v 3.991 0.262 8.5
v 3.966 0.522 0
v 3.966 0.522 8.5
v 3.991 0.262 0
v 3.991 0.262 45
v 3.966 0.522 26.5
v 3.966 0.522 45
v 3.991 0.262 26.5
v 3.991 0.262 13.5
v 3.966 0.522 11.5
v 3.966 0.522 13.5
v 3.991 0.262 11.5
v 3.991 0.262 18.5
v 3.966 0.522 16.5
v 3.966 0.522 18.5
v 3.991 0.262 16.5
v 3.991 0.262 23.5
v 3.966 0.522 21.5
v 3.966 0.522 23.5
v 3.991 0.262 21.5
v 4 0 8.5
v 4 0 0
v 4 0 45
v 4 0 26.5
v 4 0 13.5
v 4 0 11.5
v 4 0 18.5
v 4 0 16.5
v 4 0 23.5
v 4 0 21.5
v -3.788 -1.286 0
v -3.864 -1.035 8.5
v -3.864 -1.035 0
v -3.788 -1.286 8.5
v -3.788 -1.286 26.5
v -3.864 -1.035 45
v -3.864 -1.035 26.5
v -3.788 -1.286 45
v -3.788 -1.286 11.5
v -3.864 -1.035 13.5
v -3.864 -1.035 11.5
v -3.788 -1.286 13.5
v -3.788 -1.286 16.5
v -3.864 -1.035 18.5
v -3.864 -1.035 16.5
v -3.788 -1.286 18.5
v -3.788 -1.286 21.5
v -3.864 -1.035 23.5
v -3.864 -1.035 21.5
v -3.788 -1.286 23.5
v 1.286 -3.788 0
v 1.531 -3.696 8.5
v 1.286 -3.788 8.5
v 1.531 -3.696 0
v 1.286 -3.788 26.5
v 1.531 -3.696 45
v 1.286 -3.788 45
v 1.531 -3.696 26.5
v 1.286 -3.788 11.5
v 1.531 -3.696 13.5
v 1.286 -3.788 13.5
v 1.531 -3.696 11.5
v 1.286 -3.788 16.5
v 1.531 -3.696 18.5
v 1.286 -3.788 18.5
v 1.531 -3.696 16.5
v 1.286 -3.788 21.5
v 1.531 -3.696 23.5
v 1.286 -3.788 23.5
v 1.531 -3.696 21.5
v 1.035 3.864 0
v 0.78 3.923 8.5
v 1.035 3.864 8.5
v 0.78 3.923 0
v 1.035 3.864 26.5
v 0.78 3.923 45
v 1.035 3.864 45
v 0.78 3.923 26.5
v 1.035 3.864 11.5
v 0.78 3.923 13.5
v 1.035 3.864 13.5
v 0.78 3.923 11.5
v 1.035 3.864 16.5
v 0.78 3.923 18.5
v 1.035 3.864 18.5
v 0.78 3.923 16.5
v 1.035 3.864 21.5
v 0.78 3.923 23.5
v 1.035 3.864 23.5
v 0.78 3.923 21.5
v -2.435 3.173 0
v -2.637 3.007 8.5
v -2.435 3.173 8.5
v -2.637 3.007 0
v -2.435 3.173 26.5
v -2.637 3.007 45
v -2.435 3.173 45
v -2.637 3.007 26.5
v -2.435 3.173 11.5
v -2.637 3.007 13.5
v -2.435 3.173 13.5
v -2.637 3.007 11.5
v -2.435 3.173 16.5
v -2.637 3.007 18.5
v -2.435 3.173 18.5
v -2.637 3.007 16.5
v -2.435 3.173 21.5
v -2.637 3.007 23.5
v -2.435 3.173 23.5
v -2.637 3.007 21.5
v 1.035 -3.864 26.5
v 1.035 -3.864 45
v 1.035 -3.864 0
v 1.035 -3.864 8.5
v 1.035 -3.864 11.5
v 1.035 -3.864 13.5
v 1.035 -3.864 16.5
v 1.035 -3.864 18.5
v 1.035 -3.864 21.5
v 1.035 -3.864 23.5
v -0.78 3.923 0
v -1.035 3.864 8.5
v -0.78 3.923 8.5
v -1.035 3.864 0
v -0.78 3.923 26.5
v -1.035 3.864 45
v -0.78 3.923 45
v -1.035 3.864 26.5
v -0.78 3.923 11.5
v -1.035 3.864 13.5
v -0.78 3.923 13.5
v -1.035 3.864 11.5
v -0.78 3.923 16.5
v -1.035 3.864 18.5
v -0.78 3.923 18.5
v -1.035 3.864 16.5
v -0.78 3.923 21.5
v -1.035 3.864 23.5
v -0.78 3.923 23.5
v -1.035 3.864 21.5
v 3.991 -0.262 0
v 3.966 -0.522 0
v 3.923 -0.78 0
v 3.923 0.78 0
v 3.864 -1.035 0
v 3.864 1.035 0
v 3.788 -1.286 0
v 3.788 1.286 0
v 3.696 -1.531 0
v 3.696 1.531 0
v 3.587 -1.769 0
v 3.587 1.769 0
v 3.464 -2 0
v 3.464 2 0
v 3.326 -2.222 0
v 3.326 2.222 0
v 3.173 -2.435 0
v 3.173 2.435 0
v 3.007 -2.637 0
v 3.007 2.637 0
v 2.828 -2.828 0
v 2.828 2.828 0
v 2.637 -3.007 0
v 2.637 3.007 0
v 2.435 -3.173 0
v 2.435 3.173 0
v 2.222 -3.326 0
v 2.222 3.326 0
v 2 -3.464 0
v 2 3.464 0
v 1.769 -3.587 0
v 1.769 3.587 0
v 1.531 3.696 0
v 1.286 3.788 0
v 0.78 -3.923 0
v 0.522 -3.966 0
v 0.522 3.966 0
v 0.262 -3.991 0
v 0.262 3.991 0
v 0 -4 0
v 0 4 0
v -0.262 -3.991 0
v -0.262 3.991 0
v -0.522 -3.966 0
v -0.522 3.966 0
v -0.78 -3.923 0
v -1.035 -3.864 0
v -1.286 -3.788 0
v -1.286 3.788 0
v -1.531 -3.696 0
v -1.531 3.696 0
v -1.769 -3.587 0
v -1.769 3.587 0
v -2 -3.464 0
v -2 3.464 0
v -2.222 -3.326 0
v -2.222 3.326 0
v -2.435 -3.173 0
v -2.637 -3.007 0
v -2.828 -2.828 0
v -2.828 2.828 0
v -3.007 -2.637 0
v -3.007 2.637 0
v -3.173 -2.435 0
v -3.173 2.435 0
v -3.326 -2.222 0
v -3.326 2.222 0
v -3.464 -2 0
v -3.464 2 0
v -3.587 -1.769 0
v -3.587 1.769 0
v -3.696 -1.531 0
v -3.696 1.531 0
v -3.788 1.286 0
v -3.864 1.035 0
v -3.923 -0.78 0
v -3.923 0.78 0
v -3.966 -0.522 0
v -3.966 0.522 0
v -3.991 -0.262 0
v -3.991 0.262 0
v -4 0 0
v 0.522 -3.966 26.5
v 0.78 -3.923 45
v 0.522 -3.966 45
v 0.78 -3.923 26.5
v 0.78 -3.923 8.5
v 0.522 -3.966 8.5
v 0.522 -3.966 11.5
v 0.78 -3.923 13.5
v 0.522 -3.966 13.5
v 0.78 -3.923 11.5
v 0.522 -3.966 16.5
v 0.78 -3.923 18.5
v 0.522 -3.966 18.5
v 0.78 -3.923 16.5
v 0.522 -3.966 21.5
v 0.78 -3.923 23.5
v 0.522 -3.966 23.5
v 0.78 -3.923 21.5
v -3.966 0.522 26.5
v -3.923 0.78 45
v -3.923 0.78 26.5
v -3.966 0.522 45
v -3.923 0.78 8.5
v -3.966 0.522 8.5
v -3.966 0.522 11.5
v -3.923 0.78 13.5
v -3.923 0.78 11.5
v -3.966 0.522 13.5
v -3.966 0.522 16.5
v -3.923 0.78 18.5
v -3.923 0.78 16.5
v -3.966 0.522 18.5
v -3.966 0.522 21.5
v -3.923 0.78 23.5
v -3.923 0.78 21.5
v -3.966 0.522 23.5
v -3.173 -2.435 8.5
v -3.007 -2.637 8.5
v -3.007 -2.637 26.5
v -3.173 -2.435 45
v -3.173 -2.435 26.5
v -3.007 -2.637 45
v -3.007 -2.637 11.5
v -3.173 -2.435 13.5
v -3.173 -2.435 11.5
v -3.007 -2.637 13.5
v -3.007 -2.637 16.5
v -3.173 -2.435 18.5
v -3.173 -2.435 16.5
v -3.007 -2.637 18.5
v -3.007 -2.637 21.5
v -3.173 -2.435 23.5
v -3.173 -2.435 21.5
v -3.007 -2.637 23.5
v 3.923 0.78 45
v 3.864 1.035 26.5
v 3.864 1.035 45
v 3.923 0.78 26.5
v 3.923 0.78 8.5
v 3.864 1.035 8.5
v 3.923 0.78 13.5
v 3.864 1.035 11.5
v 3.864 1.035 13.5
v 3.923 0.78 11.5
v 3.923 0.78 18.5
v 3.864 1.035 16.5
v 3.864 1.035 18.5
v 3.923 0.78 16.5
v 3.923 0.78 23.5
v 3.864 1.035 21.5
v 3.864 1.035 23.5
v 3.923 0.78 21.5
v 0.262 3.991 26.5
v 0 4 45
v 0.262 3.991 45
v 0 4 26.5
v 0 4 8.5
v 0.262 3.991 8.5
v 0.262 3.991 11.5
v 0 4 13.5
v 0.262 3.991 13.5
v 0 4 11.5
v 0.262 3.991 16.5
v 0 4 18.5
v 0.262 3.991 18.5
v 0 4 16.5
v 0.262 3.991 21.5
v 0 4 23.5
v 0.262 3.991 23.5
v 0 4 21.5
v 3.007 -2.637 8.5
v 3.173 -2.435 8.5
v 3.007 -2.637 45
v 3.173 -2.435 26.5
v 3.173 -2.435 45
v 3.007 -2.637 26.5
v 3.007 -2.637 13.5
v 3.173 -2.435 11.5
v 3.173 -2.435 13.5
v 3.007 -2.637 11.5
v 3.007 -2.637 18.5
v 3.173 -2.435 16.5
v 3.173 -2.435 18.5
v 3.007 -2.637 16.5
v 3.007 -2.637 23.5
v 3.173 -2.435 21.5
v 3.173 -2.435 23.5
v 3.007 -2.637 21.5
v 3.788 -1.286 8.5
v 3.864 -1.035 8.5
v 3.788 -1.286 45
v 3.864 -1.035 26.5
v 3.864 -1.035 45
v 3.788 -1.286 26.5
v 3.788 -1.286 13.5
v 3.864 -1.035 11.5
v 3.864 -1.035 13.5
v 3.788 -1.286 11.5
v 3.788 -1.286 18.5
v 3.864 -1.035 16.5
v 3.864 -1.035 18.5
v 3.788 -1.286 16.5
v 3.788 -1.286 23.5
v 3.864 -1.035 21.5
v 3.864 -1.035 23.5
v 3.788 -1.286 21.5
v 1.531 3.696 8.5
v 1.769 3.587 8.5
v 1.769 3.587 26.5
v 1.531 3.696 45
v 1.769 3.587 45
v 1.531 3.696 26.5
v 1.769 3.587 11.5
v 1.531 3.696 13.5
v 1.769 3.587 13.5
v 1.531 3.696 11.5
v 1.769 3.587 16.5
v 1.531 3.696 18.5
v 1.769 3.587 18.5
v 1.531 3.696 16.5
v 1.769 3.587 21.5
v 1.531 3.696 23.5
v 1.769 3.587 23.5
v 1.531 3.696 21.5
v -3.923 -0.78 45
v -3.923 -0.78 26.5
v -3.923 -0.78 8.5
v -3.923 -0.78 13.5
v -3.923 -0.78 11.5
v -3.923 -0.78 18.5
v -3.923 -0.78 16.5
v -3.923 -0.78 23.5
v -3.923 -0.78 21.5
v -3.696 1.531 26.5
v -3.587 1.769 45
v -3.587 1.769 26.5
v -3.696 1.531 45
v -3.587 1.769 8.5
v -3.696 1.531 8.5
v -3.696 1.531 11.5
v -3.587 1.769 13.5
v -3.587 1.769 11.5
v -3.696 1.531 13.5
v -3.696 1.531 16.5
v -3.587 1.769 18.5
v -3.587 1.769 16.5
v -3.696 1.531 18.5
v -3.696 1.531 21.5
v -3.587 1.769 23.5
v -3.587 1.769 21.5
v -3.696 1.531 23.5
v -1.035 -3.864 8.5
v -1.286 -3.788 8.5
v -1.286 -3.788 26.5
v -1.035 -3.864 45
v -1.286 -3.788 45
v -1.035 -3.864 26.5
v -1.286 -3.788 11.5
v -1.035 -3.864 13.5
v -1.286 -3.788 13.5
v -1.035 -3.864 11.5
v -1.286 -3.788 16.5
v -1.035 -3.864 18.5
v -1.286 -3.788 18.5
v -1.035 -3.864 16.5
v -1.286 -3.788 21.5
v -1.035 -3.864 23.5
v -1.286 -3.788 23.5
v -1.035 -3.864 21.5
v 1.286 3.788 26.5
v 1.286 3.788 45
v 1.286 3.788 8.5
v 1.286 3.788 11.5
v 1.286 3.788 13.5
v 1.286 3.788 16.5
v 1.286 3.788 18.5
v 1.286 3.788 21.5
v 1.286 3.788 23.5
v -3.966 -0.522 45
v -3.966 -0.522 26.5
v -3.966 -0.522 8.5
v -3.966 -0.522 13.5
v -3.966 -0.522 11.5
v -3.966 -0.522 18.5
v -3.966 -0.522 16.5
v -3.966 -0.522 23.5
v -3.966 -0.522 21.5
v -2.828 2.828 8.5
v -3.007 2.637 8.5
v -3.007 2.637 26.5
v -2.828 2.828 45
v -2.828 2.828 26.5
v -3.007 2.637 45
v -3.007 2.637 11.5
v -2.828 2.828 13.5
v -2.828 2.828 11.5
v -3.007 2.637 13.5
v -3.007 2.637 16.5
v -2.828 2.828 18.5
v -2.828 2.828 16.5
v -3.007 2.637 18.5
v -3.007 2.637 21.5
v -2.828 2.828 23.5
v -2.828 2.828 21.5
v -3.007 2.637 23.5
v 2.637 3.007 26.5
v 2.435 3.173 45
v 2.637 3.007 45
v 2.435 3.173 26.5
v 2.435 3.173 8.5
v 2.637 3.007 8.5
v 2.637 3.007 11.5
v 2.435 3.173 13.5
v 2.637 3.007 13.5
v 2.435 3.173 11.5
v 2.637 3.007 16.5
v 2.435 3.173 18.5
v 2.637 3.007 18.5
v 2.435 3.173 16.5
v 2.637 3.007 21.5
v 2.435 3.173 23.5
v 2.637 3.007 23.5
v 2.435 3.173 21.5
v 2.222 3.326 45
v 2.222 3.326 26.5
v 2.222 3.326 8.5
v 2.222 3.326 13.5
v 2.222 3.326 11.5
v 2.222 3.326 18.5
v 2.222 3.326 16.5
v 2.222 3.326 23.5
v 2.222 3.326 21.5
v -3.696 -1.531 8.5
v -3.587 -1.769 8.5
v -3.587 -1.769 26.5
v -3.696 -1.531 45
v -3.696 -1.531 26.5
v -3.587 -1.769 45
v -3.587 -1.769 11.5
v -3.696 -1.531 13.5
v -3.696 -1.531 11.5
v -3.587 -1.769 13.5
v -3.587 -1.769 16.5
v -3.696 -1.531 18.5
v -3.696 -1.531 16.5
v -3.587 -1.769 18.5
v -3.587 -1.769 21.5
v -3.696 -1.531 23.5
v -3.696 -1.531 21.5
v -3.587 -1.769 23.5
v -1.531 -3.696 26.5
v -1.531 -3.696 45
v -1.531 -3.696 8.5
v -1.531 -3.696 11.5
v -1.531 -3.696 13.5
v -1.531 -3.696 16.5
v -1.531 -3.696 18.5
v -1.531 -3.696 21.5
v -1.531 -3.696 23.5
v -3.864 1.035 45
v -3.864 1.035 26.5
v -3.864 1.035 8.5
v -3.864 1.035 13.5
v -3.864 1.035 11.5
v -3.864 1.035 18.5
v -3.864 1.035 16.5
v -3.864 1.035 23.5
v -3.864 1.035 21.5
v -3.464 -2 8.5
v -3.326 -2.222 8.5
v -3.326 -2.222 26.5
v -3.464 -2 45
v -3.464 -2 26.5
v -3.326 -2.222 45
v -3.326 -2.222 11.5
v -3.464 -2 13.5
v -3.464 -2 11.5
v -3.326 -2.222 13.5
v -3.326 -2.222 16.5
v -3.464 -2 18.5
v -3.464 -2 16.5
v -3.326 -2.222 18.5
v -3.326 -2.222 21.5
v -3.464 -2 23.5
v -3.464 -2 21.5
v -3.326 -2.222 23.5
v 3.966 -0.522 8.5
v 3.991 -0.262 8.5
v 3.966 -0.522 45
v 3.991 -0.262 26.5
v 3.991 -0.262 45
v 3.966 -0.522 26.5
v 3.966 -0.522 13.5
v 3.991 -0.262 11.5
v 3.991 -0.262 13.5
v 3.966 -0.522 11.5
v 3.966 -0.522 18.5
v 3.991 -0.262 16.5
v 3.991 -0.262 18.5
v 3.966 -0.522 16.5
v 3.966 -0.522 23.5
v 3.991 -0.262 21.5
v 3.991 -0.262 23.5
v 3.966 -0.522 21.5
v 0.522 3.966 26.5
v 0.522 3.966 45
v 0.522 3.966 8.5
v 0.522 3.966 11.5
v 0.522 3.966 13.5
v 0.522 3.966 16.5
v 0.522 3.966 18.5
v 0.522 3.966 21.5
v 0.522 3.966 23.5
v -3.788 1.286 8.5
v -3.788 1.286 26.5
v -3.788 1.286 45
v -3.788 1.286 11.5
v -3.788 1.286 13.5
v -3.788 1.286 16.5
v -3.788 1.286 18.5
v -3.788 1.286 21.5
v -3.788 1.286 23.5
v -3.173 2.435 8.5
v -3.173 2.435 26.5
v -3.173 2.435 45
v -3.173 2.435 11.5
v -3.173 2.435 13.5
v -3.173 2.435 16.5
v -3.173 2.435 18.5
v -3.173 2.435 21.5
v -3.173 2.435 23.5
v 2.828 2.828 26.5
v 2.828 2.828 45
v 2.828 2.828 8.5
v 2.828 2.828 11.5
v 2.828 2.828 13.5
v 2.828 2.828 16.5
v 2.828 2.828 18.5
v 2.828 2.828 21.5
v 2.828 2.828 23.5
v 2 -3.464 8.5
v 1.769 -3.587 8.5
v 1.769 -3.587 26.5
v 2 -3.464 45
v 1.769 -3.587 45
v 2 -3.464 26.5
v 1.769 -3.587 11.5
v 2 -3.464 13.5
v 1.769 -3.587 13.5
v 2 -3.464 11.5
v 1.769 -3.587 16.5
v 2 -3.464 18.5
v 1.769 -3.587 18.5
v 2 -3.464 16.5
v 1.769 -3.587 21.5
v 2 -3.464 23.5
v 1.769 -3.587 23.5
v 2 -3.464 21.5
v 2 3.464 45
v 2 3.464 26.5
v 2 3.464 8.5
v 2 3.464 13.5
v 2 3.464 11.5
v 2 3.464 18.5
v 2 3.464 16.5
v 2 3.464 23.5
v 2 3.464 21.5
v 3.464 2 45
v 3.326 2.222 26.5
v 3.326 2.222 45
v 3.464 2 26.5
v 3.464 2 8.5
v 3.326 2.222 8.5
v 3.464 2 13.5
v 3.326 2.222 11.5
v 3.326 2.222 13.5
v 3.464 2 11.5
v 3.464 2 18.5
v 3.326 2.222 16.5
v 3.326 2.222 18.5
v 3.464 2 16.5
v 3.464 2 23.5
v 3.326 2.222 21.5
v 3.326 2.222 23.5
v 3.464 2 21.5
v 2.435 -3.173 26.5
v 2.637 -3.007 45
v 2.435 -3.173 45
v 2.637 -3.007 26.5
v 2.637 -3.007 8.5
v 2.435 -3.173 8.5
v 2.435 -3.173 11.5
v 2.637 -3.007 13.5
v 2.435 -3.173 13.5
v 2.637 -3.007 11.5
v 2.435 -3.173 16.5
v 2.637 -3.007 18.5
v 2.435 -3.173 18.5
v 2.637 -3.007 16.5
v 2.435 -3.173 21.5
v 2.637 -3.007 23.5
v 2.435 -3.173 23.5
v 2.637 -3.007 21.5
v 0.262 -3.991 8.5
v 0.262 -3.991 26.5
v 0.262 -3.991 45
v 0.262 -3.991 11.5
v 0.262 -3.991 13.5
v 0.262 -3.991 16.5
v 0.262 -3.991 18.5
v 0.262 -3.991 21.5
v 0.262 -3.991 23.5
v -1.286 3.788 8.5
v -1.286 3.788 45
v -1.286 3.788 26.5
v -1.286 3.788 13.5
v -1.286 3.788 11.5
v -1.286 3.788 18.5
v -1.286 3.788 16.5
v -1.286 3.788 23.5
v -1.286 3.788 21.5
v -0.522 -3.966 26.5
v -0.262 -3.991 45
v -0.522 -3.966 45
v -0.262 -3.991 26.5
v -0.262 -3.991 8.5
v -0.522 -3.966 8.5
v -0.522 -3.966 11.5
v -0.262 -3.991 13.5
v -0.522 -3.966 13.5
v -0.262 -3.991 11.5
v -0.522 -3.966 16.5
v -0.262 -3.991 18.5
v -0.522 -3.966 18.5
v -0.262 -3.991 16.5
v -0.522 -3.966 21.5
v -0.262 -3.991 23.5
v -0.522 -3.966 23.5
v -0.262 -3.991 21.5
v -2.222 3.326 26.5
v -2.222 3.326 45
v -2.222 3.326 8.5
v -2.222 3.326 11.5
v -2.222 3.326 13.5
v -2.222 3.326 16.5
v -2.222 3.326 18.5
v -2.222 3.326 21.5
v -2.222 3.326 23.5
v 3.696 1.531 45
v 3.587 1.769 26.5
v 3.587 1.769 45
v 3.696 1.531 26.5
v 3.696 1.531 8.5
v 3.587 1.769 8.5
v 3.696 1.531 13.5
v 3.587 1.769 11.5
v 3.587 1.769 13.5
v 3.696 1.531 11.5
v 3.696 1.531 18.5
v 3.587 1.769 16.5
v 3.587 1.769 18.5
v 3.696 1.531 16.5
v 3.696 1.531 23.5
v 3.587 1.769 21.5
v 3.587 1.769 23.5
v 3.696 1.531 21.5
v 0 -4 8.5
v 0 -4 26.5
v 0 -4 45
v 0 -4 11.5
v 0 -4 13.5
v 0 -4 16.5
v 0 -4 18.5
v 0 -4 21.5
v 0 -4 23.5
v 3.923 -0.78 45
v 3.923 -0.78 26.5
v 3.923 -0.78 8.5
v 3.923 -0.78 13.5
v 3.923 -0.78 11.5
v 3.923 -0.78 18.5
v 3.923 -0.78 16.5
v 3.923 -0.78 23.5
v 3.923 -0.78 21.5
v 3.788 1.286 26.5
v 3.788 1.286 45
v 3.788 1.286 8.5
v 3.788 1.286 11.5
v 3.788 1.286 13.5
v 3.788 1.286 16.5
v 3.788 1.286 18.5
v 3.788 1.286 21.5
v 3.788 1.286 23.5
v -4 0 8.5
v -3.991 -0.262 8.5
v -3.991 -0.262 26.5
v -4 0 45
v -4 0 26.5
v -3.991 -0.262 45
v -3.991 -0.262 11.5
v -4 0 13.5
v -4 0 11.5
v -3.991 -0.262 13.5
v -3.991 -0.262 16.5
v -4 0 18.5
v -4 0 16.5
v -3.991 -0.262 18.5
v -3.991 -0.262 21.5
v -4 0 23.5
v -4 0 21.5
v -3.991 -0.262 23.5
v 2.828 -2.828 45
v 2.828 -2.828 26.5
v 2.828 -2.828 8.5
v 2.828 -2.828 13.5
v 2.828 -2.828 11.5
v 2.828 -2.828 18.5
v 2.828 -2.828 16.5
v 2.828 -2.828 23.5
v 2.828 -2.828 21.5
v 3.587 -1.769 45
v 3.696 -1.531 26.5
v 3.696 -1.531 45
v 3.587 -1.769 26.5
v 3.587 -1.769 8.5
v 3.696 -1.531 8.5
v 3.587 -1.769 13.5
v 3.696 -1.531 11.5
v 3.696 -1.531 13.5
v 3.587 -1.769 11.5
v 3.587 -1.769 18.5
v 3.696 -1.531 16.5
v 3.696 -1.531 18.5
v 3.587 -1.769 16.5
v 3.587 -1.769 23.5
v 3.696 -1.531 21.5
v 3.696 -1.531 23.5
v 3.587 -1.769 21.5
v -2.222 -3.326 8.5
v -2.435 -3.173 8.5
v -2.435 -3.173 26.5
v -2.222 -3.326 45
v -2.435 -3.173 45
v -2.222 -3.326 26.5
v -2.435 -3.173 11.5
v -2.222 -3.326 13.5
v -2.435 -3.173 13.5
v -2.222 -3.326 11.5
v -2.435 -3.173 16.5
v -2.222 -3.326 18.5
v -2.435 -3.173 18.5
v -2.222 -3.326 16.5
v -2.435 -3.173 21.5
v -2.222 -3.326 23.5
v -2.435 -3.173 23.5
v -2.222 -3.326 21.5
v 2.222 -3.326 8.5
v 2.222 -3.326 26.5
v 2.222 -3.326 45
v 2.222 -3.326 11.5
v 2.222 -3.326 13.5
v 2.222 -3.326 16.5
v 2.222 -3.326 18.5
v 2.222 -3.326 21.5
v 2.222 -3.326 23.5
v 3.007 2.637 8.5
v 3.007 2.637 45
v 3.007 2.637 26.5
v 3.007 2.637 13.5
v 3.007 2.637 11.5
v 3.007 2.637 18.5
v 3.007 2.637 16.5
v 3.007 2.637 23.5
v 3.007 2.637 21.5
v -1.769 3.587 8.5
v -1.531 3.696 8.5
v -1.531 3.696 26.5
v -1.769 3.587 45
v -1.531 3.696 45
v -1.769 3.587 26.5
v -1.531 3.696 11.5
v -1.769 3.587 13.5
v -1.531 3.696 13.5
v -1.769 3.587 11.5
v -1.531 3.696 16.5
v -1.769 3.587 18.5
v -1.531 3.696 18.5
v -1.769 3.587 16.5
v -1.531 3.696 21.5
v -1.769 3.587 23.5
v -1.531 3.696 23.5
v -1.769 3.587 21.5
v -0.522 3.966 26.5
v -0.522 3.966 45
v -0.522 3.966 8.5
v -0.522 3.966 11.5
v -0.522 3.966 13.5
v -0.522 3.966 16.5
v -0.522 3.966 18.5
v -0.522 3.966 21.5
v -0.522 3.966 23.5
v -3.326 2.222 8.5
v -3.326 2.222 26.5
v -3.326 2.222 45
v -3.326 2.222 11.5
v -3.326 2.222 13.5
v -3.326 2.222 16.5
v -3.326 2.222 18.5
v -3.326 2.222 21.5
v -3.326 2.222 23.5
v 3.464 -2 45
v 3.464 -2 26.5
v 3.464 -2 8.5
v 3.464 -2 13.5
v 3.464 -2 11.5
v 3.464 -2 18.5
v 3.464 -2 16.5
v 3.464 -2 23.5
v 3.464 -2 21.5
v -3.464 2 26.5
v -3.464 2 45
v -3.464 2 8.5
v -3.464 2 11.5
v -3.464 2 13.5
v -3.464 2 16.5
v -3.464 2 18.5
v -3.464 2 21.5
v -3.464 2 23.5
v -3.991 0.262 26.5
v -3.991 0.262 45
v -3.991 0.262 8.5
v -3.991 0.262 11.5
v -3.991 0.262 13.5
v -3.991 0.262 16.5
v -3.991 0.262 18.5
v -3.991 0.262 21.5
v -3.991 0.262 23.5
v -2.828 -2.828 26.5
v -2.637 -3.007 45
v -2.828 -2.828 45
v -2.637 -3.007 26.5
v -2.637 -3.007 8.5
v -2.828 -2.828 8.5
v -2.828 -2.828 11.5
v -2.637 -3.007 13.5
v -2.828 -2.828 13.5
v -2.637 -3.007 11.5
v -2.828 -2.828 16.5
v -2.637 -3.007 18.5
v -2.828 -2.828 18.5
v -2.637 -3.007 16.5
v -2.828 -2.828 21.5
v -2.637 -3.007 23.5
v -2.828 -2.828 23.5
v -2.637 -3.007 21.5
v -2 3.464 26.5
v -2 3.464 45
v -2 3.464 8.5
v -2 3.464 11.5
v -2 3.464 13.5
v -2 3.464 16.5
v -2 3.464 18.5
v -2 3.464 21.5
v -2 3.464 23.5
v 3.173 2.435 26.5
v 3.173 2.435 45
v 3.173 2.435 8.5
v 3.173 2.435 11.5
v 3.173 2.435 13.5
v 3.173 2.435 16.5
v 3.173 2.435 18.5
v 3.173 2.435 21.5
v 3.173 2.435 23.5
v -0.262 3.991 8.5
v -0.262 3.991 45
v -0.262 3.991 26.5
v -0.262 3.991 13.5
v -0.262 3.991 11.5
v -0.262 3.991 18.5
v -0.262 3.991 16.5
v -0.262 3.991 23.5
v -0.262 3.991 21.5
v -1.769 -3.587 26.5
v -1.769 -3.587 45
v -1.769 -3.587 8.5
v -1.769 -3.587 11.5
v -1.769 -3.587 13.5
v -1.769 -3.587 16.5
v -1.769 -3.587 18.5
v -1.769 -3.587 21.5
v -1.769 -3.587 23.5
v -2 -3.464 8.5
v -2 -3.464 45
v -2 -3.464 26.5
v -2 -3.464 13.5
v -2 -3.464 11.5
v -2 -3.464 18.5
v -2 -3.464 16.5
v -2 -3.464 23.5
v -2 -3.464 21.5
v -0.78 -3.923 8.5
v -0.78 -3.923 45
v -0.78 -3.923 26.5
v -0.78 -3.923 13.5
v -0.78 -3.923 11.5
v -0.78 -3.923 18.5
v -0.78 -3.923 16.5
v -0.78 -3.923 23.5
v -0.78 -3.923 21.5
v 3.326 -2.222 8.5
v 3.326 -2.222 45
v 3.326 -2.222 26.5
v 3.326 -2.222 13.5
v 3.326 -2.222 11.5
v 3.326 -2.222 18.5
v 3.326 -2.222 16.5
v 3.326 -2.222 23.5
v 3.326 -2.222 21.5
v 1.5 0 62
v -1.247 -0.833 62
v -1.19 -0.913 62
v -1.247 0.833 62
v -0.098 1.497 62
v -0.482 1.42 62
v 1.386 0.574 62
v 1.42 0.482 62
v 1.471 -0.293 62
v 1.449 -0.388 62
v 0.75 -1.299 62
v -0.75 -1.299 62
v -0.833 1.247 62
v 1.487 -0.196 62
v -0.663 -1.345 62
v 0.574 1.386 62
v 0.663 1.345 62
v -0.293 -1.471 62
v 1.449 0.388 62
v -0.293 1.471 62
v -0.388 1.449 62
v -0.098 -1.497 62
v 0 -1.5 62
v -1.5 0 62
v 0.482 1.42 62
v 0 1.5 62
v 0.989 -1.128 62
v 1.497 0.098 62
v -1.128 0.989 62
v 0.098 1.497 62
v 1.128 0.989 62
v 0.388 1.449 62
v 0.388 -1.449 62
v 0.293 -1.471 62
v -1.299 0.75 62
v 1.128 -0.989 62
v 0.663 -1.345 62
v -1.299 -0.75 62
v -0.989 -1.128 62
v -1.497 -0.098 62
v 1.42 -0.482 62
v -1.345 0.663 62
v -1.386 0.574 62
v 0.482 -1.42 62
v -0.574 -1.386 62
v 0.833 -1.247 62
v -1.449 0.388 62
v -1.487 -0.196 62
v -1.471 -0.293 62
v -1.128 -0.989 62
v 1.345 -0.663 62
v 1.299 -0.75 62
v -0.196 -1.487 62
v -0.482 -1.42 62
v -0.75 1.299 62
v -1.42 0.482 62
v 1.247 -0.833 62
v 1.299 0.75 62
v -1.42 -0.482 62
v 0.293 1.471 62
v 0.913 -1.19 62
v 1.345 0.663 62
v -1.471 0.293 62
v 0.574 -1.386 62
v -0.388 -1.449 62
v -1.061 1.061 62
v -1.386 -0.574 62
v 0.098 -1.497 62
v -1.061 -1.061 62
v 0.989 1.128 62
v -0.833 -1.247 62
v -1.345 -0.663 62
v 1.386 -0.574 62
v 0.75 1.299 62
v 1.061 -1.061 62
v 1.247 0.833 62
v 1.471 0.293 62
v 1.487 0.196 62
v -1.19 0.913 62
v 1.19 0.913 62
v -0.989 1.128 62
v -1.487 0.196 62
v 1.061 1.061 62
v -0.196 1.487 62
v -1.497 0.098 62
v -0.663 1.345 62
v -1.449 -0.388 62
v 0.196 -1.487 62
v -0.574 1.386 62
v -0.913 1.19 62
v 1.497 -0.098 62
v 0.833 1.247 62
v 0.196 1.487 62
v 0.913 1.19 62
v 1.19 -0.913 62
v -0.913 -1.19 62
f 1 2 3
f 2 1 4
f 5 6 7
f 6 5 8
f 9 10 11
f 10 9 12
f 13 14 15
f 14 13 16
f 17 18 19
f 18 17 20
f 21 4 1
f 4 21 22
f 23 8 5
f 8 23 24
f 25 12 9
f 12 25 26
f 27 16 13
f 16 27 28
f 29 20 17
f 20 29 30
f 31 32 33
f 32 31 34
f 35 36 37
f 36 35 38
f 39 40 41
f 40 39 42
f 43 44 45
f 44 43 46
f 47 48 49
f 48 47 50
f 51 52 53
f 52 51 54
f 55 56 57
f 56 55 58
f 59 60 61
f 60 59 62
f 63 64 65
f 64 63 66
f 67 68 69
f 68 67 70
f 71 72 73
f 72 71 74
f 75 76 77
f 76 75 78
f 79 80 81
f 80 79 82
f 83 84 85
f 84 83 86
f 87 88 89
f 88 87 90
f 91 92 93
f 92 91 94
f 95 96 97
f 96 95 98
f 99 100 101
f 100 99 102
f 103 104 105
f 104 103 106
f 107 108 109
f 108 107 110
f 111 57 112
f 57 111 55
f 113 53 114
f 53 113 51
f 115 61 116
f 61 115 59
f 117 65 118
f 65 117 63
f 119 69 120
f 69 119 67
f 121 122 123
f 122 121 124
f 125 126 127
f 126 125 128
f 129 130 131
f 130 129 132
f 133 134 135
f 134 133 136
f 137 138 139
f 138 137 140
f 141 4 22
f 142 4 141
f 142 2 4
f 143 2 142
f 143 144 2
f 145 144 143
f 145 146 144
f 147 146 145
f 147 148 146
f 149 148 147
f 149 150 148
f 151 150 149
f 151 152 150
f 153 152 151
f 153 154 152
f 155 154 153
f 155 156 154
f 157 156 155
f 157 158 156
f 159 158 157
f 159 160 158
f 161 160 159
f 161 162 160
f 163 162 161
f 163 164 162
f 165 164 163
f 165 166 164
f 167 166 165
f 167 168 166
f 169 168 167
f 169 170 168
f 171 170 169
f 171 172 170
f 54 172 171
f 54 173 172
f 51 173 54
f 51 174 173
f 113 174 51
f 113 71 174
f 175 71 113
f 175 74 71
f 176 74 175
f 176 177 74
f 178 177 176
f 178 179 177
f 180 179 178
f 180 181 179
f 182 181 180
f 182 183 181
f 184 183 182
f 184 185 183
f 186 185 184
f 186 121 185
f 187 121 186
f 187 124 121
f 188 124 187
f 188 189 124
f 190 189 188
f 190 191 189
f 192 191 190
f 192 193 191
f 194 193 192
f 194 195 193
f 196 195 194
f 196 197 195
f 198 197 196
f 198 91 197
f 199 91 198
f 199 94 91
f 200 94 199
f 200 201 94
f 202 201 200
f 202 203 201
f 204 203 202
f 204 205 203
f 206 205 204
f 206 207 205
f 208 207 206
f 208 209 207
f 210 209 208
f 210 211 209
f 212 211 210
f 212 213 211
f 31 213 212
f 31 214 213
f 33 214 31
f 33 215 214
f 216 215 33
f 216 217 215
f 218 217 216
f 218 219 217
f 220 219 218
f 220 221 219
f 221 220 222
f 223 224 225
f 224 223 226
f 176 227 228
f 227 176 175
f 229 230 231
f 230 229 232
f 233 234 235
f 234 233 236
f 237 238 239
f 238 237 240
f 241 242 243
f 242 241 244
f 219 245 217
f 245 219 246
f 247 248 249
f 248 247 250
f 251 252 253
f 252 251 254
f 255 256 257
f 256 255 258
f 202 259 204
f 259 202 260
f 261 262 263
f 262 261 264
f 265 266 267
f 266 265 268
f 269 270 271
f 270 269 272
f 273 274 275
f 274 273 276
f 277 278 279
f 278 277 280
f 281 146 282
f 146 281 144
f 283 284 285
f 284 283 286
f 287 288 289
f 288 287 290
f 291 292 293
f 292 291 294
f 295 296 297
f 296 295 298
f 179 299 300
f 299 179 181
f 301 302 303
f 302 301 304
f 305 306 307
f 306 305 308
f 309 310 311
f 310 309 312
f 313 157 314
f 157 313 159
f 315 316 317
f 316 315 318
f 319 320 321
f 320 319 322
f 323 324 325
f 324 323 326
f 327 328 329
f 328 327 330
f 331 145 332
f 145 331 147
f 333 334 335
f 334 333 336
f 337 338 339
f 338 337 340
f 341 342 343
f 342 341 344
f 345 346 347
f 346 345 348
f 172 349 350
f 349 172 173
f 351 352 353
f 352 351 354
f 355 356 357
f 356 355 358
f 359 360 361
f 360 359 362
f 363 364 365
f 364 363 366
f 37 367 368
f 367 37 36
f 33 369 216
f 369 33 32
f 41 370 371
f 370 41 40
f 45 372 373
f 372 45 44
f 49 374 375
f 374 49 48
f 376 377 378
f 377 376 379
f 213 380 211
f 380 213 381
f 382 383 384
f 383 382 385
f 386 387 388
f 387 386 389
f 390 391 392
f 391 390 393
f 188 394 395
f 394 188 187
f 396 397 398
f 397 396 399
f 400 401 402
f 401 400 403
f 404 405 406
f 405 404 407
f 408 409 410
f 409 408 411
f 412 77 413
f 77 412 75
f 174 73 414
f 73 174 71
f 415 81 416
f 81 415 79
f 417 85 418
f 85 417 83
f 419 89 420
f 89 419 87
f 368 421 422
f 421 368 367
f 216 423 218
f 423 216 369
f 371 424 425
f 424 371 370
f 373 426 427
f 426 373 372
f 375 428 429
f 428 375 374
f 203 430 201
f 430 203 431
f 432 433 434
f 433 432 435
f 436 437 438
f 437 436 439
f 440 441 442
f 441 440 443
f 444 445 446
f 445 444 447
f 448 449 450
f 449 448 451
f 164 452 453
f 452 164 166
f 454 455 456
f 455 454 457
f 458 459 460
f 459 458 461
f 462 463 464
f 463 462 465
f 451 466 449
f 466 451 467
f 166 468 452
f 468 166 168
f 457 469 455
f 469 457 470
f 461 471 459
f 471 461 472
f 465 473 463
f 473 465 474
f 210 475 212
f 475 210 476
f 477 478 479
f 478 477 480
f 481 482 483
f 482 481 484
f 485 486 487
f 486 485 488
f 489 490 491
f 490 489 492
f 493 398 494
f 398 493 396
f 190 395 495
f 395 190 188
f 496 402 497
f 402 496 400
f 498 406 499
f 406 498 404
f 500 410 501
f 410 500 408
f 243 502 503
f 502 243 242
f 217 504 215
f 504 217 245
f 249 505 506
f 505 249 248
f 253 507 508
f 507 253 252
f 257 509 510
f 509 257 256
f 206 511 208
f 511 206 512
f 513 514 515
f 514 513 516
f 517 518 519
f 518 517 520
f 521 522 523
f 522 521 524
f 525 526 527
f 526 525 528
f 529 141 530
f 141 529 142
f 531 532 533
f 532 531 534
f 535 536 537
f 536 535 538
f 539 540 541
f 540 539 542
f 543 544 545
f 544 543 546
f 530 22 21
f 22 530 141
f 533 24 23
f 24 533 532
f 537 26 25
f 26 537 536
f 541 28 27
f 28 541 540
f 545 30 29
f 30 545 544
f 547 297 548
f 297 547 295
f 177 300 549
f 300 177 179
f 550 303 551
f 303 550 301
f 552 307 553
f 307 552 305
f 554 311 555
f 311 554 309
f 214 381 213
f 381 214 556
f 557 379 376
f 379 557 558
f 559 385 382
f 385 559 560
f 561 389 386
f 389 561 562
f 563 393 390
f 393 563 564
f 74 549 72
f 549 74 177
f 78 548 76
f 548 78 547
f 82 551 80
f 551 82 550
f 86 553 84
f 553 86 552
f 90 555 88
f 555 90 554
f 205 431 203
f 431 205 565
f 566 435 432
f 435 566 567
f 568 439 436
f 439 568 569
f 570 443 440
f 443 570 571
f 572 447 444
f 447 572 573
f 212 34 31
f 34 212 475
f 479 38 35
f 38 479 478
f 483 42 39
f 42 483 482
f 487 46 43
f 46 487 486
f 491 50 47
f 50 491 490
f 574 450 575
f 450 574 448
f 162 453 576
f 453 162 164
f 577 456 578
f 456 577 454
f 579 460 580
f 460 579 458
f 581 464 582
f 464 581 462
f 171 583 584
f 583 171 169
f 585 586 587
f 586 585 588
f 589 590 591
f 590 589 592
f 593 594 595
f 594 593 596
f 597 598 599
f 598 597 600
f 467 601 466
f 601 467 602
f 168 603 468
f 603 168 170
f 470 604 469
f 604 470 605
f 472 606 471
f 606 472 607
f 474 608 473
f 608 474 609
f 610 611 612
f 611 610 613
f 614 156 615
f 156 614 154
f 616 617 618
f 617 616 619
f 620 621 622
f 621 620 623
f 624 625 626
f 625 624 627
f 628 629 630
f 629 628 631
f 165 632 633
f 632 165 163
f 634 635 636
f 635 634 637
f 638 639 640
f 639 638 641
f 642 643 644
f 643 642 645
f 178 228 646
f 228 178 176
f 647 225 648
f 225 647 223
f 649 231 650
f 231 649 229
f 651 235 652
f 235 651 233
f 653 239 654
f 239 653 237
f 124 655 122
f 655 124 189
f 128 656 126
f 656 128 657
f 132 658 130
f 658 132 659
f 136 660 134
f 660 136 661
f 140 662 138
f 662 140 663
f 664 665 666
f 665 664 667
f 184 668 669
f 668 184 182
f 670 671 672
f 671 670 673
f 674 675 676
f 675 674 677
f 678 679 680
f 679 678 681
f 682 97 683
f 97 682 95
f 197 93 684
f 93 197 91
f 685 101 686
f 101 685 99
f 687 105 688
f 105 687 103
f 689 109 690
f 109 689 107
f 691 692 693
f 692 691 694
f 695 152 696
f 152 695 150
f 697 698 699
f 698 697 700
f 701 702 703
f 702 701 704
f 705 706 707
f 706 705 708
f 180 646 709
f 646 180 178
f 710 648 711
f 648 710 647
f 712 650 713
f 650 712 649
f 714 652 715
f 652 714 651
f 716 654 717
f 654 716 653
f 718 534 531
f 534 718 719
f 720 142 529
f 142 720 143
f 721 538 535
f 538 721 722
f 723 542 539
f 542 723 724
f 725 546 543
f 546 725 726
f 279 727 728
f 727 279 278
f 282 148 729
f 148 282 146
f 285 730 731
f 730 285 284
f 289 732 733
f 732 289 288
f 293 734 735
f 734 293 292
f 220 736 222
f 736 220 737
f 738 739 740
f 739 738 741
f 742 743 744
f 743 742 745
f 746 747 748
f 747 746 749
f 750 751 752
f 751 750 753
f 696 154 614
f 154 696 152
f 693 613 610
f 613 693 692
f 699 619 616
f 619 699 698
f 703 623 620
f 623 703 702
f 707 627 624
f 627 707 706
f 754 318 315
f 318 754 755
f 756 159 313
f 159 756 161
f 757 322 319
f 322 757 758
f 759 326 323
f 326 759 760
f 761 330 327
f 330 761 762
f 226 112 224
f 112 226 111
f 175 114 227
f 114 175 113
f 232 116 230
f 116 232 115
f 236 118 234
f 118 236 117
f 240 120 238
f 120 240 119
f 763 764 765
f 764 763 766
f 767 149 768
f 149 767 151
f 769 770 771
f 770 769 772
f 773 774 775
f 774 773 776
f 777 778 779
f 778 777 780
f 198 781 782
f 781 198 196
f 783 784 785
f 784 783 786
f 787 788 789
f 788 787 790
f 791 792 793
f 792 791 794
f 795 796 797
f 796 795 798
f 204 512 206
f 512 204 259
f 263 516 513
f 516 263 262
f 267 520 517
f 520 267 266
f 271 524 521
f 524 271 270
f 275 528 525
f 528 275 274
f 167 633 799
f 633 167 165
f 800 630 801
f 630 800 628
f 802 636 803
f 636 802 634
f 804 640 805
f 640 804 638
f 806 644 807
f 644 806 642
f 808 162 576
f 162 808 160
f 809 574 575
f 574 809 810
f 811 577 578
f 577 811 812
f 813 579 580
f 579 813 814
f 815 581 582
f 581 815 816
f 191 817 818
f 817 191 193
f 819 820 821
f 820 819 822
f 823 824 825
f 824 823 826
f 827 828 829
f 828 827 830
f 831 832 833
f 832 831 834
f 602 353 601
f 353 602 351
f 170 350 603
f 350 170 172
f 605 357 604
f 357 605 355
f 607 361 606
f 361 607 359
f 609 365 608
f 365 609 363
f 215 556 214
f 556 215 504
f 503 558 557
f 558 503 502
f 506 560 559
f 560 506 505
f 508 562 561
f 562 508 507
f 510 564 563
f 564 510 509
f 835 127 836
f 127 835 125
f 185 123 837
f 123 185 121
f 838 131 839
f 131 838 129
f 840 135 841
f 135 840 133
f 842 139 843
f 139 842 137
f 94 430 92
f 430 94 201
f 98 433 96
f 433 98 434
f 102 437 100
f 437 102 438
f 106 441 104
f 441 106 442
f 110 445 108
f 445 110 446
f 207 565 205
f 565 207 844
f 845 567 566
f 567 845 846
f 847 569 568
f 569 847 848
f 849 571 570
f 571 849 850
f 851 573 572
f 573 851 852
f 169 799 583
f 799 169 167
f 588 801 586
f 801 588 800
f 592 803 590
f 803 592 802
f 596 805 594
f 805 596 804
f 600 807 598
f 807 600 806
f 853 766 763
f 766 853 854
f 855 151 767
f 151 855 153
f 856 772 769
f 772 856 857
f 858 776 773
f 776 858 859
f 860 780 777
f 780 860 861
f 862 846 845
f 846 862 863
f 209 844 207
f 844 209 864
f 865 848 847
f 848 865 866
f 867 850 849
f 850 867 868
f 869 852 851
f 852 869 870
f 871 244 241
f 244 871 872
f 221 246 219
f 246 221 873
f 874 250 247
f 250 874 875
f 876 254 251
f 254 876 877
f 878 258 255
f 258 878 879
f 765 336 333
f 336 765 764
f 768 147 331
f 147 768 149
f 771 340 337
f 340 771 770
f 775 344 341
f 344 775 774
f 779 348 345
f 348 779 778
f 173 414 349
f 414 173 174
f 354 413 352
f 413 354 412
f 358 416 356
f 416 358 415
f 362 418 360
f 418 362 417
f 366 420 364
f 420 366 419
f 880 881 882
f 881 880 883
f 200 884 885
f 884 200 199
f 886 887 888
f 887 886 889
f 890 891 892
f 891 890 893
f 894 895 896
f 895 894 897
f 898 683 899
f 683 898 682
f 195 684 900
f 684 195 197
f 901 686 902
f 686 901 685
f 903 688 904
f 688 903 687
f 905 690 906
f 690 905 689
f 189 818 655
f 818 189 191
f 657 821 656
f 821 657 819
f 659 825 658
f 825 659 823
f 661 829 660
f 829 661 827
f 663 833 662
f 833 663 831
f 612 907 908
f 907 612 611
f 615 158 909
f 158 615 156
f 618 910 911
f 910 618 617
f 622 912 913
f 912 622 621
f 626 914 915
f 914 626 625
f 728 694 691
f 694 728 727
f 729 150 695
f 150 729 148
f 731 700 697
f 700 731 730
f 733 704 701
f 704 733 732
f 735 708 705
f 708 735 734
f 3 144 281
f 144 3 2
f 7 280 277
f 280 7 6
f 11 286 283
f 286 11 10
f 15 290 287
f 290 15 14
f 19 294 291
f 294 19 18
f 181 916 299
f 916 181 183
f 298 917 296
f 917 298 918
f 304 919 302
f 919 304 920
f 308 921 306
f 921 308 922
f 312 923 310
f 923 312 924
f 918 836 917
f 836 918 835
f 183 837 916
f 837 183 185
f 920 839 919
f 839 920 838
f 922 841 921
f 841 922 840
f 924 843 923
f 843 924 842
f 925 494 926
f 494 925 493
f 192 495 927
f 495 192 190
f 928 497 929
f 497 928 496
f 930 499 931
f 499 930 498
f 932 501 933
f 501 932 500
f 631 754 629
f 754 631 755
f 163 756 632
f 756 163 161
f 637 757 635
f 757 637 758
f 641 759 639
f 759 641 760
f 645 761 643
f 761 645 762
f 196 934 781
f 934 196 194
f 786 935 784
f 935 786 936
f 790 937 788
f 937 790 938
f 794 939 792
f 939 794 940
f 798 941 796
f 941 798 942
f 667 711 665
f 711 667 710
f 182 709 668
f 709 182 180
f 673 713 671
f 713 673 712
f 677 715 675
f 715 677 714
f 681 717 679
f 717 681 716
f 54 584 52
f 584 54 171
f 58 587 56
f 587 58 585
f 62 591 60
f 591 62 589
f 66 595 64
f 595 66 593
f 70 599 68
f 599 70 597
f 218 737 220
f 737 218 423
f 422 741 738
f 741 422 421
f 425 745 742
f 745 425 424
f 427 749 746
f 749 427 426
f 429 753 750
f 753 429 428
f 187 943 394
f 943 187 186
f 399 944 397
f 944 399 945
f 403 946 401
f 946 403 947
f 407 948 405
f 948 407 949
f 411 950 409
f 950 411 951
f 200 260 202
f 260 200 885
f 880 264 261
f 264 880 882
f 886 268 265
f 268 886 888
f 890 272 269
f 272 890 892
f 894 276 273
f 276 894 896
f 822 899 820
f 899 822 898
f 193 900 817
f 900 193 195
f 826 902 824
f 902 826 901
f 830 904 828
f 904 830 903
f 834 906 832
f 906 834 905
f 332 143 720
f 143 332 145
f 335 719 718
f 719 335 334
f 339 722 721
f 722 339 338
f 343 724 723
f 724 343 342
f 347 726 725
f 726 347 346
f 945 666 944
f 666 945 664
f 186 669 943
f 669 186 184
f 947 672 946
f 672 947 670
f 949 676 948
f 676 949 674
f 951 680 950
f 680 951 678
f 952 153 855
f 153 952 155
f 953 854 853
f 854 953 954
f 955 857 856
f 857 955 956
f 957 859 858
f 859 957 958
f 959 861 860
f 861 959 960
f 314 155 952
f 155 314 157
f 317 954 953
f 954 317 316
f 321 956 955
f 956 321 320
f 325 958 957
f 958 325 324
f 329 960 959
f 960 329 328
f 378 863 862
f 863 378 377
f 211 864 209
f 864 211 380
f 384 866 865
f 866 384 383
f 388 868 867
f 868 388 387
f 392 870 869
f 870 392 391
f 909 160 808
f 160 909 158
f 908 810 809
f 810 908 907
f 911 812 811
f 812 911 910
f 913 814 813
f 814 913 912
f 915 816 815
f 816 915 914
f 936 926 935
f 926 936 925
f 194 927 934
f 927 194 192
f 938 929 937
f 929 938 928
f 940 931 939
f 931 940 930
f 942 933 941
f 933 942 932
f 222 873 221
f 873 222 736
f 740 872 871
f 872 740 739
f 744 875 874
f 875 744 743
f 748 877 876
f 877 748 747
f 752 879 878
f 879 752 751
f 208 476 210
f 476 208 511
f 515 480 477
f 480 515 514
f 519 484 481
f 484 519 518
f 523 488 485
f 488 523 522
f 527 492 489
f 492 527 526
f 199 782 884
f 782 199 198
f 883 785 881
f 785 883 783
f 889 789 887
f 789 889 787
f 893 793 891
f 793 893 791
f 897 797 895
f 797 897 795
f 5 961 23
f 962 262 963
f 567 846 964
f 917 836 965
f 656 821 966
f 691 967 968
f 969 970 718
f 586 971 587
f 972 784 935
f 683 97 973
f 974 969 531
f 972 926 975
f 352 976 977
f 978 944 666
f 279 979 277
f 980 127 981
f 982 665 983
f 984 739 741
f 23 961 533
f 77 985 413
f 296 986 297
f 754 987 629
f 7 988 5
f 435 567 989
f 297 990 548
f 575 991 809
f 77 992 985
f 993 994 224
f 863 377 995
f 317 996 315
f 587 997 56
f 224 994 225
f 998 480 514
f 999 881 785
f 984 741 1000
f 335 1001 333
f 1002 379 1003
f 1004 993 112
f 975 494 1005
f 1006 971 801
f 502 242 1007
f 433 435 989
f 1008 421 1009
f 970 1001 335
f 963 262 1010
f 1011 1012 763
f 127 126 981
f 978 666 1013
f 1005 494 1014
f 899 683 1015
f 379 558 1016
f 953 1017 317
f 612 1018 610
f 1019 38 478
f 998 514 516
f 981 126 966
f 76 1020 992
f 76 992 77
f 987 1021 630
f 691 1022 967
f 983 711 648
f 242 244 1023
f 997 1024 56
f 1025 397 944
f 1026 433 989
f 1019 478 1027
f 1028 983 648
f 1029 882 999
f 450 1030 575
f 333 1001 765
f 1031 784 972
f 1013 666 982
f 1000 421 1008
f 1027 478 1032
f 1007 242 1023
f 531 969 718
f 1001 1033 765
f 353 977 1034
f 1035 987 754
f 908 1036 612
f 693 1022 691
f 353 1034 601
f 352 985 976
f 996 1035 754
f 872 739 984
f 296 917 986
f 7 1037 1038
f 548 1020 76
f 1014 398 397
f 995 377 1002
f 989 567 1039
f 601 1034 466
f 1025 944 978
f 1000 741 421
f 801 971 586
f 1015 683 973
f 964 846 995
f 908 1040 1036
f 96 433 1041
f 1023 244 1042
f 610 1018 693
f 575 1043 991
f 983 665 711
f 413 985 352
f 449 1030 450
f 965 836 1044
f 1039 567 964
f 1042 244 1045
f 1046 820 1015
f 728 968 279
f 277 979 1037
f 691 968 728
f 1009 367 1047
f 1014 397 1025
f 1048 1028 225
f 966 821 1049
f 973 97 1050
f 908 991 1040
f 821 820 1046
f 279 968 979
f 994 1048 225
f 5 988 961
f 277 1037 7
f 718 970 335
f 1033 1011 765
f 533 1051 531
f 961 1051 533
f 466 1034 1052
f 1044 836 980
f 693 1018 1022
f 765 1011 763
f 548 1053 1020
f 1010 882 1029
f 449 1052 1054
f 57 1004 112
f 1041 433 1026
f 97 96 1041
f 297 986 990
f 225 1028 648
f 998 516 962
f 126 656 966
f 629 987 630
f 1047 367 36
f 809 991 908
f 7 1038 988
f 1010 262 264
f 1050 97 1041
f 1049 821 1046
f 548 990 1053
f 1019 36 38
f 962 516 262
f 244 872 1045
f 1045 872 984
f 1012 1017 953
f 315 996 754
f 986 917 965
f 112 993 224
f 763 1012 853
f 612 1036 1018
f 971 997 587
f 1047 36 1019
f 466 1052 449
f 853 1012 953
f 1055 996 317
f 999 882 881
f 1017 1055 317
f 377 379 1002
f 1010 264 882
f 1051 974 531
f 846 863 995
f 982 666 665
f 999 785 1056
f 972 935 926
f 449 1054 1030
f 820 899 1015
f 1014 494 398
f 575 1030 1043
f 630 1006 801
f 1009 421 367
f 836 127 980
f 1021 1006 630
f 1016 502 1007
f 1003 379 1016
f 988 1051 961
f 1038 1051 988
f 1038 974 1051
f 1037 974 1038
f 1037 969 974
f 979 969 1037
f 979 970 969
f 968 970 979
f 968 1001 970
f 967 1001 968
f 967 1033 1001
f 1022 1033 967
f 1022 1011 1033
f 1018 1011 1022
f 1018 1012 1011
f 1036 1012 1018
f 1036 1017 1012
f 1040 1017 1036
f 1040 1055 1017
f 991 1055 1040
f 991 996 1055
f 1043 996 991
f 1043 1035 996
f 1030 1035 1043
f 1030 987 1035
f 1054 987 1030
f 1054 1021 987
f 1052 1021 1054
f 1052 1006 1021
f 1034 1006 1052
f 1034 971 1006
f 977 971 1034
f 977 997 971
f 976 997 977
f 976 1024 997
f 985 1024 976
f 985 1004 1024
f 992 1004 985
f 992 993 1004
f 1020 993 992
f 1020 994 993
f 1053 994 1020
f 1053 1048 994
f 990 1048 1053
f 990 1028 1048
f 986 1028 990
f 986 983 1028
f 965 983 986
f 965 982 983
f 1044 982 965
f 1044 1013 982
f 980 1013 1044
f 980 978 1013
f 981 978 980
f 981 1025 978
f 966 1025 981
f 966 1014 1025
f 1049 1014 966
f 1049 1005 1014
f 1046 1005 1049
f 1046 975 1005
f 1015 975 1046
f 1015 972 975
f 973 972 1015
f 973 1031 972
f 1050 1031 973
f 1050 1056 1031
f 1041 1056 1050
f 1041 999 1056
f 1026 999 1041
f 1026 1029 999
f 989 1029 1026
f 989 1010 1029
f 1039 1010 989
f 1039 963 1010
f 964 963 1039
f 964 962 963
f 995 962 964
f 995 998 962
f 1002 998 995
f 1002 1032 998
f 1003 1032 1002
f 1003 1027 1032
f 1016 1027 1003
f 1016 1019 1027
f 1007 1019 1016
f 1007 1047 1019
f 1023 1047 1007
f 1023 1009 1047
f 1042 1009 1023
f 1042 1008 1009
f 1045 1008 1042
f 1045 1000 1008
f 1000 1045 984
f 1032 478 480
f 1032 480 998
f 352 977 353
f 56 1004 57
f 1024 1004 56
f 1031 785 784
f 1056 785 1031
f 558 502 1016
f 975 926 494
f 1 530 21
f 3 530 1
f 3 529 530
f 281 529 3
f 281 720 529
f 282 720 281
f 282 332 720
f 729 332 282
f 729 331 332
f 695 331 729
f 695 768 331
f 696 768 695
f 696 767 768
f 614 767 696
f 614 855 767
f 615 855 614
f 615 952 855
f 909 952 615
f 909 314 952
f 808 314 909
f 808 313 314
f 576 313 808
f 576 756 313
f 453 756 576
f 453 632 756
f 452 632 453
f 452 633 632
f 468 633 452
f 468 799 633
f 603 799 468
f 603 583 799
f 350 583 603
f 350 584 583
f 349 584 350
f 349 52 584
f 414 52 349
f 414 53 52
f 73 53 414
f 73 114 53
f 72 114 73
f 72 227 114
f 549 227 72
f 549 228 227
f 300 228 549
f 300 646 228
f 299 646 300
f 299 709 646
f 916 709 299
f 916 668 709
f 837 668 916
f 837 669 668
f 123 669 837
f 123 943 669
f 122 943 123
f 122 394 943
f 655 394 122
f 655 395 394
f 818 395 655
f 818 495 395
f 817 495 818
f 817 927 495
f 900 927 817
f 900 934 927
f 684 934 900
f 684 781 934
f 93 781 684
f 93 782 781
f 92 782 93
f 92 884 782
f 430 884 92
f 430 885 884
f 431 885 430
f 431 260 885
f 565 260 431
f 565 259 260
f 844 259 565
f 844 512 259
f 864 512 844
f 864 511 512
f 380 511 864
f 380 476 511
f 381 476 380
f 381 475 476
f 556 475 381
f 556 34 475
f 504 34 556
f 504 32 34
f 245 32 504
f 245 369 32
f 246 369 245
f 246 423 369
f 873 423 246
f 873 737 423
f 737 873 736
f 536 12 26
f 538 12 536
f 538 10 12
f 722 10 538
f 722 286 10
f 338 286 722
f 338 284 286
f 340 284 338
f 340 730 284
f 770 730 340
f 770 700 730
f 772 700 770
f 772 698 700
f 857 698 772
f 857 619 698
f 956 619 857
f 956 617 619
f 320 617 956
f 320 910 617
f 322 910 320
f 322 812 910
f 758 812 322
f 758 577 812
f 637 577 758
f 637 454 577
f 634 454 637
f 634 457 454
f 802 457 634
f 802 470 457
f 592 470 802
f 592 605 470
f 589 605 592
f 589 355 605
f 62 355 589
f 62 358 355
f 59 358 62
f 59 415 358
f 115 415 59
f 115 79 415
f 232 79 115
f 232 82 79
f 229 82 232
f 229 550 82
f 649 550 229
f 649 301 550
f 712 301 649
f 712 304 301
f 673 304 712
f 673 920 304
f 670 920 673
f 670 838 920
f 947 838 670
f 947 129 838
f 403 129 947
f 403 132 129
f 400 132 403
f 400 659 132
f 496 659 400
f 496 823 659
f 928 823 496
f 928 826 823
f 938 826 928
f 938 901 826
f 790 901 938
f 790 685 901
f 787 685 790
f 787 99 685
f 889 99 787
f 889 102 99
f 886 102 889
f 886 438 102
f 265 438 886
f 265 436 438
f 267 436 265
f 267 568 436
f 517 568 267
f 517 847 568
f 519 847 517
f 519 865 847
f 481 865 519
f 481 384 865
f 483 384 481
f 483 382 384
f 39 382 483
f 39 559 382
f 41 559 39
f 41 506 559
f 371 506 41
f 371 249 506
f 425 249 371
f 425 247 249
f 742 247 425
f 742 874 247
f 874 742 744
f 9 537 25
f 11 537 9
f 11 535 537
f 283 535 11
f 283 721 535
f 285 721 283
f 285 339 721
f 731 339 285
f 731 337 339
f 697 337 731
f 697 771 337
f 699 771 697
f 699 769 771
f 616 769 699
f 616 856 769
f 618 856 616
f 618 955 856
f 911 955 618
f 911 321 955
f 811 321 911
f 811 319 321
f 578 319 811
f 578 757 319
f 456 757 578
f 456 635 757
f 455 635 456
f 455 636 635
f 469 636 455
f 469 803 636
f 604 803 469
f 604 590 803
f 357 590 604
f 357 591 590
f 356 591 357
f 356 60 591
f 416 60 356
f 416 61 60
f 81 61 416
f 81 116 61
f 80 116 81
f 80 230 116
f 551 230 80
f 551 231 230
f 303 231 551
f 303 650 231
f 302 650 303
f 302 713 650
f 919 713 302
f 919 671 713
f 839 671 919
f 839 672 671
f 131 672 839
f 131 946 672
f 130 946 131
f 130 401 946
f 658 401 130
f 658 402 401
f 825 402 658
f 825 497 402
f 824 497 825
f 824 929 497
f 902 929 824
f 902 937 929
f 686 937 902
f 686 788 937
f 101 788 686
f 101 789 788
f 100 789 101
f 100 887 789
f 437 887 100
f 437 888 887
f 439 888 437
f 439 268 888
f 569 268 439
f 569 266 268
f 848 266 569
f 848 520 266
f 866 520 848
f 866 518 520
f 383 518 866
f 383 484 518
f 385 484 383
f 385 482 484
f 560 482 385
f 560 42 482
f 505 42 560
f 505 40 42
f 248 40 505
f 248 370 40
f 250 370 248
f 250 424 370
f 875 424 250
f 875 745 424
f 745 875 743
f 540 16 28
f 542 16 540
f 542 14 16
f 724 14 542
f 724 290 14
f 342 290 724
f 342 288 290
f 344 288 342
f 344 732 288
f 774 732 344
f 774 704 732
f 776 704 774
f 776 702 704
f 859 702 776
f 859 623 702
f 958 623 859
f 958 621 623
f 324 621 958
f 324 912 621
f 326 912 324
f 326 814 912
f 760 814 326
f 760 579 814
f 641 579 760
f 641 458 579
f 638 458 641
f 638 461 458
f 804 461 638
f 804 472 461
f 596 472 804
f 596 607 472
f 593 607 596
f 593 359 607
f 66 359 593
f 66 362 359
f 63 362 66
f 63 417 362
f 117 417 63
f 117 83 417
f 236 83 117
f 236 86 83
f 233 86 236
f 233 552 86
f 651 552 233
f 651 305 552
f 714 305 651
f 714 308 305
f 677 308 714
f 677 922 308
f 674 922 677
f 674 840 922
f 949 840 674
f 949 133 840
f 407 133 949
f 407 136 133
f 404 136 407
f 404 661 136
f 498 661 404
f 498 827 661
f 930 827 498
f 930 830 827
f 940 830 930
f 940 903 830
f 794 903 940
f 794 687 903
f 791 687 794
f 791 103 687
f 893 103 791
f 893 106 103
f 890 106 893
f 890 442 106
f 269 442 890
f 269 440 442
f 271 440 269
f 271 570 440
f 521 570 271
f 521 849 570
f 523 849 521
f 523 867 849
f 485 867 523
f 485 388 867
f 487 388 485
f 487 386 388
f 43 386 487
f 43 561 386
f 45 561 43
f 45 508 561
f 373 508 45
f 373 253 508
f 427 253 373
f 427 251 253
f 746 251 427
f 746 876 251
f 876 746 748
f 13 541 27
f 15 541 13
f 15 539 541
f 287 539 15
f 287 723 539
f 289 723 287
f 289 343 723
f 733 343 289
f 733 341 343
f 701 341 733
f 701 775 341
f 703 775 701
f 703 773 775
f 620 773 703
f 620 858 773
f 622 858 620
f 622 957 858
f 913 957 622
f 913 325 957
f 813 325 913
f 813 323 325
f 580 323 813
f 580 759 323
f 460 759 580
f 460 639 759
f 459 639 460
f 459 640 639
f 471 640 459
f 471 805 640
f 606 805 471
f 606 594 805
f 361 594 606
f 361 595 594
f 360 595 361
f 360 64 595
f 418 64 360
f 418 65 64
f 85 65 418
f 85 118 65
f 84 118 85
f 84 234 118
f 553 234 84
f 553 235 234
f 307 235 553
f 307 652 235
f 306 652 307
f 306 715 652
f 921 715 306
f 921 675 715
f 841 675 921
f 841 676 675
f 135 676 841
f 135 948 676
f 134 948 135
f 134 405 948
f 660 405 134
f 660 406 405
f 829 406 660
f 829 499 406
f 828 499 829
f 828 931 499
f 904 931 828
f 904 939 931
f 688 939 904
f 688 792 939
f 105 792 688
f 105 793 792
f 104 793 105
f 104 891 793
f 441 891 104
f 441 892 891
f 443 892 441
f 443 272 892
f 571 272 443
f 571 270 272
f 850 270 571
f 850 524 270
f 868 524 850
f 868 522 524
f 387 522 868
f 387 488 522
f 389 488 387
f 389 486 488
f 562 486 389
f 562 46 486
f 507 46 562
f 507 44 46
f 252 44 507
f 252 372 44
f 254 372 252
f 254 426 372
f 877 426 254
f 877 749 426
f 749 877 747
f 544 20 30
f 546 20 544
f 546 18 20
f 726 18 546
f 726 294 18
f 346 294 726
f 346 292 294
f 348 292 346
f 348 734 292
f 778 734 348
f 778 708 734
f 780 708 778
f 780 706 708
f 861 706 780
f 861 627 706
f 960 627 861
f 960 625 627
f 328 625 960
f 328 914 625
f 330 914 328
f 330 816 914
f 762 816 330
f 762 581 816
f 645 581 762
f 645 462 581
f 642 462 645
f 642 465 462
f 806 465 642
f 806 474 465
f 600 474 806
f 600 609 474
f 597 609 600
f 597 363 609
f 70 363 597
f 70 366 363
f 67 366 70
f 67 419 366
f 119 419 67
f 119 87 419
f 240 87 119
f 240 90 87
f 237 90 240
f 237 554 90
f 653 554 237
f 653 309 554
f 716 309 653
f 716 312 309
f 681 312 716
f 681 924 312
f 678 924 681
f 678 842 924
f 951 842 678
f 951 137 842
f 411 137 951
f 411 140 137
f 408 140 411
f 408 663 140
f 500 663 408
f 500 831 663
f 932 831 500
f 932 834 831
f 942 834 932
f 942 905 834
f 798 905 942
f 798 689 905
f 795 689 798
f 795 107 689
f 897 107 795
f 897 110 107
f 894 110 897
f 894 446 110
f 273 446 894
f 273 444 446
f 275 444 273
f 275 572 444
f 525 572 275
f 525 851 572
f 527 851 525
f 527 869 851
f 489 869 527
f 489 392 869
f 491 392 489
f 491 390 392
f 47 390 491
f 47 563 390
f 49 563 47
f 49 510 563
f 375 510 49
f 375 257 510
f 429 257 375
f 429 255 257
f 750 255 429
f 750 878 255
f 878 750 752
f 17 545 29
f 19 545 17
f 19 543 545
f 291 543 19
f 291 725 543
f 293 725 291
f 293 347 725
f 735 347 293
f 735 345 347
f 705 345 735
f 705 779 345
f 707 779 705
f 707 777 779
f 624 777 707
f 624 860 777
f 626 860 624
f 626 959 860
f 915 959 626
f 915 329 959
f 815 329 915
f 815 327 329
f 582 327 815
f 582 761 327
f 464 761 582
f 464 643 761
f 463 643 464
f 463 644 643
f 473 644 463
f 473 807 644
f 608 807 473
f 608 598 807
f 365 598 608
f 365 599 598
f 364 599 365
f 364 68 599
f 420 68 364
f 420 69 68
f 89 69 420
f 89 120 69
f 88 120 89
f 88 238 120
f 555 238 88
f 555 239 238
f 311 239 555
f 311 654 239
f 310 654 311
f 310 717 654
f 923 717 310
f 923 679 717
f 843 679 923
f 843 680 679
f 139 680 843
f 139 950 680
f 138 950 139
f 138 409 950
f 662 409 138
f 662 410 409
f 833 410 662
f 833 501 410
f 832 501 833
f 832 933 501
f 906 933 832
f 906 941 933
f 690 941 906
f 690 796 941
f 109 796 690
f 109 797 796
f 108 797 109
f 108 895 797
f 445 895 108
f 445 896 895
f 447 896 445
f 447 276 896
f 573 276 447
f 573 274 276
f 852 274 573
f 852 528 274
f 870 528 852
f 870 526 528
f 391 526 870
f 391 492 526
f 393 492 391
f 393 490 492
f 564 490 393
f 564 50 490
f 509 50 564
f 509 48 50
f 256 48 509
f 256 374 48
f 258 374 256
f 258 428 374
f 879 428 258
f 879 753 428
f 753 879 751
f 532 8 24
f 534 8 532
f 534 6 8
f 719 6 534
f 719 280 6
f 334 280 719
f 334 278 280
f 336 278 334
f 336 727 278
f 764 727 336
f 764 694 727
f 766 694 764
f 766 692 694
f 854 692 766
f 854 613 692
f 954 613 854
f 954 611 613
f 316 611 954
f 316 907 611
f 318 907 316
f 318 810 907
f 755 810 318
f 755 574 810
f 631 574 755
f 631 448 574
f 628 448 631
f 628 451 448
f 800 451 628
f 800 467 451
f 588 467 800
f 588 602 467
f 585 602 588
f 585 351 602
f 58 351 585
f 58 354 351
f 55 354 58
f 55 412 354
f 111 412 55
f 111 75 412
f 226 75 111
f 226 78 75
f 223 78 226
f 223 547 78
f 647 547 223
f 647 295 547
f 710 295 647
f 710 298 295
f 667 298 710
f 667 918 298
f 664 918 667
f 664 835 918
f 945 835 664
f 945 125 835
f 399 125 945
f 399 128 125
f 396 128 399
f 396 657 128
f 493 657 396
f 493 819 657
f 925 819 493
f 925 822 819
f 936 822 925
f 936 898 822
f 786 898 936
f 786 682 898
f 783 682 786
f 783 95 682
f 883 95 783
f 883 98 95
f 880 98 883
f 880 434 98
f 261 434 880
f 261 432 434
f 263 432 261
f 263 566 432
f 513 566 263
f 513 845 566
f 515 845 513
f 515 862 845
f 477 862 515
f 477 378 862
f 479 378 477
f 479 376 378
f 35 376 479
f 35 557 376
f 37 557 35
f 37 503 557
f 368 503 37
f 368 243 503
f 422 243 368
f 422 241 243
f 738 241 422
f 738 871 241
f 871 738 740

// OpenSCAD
// Pestle for 1.5 mL microcentrifuge tube
// Print orientation: standing upright on XY plane

// ---- Dimensions (mm) ----
handle_d      = 8;     // handle diameter (z = 0 to 45)
cone_top_d    = 8;     // cone diameter at z = 45
cone_bottom_d = 3;     // cone diameter at z = 62
tip_d         = 3;     // sphere tip diameter, centre at z = 62
groove_w      = 2;     // groove width in Z
groove_depth  = 1;     // groove depth into handle
groove_z      = [10, 15, 20, 25]; // groove centre heights

// ---- Modelling parameters ----
eps = 0.5;             // cutter overshoot past faces
$fn = 96;              // curve resolution

// ---- Model ----
difference() {
    union() {
        // Handle
        cylinder(d = handle_d, h = 45);
        // Cone (z = 45 to 62)
        translate([0, 0, 45])
            cylinder(d1 = cone_top_d, d2 = cone_bottom_d, h = 17);
        // Rounded tip (sphere centred at z = 62)
        translate([0, 0, 62 - tip_d / 2])
            sphere(d = tip_d);
    }
    // Grip grooves
    for (z = groove_z)
        translate([0, 0, z - groove_w / 2 - eps])
            cylinder(d = handle_d + 2 * eps, h = groove_w + 2 * eps, $fn = 64);
}
